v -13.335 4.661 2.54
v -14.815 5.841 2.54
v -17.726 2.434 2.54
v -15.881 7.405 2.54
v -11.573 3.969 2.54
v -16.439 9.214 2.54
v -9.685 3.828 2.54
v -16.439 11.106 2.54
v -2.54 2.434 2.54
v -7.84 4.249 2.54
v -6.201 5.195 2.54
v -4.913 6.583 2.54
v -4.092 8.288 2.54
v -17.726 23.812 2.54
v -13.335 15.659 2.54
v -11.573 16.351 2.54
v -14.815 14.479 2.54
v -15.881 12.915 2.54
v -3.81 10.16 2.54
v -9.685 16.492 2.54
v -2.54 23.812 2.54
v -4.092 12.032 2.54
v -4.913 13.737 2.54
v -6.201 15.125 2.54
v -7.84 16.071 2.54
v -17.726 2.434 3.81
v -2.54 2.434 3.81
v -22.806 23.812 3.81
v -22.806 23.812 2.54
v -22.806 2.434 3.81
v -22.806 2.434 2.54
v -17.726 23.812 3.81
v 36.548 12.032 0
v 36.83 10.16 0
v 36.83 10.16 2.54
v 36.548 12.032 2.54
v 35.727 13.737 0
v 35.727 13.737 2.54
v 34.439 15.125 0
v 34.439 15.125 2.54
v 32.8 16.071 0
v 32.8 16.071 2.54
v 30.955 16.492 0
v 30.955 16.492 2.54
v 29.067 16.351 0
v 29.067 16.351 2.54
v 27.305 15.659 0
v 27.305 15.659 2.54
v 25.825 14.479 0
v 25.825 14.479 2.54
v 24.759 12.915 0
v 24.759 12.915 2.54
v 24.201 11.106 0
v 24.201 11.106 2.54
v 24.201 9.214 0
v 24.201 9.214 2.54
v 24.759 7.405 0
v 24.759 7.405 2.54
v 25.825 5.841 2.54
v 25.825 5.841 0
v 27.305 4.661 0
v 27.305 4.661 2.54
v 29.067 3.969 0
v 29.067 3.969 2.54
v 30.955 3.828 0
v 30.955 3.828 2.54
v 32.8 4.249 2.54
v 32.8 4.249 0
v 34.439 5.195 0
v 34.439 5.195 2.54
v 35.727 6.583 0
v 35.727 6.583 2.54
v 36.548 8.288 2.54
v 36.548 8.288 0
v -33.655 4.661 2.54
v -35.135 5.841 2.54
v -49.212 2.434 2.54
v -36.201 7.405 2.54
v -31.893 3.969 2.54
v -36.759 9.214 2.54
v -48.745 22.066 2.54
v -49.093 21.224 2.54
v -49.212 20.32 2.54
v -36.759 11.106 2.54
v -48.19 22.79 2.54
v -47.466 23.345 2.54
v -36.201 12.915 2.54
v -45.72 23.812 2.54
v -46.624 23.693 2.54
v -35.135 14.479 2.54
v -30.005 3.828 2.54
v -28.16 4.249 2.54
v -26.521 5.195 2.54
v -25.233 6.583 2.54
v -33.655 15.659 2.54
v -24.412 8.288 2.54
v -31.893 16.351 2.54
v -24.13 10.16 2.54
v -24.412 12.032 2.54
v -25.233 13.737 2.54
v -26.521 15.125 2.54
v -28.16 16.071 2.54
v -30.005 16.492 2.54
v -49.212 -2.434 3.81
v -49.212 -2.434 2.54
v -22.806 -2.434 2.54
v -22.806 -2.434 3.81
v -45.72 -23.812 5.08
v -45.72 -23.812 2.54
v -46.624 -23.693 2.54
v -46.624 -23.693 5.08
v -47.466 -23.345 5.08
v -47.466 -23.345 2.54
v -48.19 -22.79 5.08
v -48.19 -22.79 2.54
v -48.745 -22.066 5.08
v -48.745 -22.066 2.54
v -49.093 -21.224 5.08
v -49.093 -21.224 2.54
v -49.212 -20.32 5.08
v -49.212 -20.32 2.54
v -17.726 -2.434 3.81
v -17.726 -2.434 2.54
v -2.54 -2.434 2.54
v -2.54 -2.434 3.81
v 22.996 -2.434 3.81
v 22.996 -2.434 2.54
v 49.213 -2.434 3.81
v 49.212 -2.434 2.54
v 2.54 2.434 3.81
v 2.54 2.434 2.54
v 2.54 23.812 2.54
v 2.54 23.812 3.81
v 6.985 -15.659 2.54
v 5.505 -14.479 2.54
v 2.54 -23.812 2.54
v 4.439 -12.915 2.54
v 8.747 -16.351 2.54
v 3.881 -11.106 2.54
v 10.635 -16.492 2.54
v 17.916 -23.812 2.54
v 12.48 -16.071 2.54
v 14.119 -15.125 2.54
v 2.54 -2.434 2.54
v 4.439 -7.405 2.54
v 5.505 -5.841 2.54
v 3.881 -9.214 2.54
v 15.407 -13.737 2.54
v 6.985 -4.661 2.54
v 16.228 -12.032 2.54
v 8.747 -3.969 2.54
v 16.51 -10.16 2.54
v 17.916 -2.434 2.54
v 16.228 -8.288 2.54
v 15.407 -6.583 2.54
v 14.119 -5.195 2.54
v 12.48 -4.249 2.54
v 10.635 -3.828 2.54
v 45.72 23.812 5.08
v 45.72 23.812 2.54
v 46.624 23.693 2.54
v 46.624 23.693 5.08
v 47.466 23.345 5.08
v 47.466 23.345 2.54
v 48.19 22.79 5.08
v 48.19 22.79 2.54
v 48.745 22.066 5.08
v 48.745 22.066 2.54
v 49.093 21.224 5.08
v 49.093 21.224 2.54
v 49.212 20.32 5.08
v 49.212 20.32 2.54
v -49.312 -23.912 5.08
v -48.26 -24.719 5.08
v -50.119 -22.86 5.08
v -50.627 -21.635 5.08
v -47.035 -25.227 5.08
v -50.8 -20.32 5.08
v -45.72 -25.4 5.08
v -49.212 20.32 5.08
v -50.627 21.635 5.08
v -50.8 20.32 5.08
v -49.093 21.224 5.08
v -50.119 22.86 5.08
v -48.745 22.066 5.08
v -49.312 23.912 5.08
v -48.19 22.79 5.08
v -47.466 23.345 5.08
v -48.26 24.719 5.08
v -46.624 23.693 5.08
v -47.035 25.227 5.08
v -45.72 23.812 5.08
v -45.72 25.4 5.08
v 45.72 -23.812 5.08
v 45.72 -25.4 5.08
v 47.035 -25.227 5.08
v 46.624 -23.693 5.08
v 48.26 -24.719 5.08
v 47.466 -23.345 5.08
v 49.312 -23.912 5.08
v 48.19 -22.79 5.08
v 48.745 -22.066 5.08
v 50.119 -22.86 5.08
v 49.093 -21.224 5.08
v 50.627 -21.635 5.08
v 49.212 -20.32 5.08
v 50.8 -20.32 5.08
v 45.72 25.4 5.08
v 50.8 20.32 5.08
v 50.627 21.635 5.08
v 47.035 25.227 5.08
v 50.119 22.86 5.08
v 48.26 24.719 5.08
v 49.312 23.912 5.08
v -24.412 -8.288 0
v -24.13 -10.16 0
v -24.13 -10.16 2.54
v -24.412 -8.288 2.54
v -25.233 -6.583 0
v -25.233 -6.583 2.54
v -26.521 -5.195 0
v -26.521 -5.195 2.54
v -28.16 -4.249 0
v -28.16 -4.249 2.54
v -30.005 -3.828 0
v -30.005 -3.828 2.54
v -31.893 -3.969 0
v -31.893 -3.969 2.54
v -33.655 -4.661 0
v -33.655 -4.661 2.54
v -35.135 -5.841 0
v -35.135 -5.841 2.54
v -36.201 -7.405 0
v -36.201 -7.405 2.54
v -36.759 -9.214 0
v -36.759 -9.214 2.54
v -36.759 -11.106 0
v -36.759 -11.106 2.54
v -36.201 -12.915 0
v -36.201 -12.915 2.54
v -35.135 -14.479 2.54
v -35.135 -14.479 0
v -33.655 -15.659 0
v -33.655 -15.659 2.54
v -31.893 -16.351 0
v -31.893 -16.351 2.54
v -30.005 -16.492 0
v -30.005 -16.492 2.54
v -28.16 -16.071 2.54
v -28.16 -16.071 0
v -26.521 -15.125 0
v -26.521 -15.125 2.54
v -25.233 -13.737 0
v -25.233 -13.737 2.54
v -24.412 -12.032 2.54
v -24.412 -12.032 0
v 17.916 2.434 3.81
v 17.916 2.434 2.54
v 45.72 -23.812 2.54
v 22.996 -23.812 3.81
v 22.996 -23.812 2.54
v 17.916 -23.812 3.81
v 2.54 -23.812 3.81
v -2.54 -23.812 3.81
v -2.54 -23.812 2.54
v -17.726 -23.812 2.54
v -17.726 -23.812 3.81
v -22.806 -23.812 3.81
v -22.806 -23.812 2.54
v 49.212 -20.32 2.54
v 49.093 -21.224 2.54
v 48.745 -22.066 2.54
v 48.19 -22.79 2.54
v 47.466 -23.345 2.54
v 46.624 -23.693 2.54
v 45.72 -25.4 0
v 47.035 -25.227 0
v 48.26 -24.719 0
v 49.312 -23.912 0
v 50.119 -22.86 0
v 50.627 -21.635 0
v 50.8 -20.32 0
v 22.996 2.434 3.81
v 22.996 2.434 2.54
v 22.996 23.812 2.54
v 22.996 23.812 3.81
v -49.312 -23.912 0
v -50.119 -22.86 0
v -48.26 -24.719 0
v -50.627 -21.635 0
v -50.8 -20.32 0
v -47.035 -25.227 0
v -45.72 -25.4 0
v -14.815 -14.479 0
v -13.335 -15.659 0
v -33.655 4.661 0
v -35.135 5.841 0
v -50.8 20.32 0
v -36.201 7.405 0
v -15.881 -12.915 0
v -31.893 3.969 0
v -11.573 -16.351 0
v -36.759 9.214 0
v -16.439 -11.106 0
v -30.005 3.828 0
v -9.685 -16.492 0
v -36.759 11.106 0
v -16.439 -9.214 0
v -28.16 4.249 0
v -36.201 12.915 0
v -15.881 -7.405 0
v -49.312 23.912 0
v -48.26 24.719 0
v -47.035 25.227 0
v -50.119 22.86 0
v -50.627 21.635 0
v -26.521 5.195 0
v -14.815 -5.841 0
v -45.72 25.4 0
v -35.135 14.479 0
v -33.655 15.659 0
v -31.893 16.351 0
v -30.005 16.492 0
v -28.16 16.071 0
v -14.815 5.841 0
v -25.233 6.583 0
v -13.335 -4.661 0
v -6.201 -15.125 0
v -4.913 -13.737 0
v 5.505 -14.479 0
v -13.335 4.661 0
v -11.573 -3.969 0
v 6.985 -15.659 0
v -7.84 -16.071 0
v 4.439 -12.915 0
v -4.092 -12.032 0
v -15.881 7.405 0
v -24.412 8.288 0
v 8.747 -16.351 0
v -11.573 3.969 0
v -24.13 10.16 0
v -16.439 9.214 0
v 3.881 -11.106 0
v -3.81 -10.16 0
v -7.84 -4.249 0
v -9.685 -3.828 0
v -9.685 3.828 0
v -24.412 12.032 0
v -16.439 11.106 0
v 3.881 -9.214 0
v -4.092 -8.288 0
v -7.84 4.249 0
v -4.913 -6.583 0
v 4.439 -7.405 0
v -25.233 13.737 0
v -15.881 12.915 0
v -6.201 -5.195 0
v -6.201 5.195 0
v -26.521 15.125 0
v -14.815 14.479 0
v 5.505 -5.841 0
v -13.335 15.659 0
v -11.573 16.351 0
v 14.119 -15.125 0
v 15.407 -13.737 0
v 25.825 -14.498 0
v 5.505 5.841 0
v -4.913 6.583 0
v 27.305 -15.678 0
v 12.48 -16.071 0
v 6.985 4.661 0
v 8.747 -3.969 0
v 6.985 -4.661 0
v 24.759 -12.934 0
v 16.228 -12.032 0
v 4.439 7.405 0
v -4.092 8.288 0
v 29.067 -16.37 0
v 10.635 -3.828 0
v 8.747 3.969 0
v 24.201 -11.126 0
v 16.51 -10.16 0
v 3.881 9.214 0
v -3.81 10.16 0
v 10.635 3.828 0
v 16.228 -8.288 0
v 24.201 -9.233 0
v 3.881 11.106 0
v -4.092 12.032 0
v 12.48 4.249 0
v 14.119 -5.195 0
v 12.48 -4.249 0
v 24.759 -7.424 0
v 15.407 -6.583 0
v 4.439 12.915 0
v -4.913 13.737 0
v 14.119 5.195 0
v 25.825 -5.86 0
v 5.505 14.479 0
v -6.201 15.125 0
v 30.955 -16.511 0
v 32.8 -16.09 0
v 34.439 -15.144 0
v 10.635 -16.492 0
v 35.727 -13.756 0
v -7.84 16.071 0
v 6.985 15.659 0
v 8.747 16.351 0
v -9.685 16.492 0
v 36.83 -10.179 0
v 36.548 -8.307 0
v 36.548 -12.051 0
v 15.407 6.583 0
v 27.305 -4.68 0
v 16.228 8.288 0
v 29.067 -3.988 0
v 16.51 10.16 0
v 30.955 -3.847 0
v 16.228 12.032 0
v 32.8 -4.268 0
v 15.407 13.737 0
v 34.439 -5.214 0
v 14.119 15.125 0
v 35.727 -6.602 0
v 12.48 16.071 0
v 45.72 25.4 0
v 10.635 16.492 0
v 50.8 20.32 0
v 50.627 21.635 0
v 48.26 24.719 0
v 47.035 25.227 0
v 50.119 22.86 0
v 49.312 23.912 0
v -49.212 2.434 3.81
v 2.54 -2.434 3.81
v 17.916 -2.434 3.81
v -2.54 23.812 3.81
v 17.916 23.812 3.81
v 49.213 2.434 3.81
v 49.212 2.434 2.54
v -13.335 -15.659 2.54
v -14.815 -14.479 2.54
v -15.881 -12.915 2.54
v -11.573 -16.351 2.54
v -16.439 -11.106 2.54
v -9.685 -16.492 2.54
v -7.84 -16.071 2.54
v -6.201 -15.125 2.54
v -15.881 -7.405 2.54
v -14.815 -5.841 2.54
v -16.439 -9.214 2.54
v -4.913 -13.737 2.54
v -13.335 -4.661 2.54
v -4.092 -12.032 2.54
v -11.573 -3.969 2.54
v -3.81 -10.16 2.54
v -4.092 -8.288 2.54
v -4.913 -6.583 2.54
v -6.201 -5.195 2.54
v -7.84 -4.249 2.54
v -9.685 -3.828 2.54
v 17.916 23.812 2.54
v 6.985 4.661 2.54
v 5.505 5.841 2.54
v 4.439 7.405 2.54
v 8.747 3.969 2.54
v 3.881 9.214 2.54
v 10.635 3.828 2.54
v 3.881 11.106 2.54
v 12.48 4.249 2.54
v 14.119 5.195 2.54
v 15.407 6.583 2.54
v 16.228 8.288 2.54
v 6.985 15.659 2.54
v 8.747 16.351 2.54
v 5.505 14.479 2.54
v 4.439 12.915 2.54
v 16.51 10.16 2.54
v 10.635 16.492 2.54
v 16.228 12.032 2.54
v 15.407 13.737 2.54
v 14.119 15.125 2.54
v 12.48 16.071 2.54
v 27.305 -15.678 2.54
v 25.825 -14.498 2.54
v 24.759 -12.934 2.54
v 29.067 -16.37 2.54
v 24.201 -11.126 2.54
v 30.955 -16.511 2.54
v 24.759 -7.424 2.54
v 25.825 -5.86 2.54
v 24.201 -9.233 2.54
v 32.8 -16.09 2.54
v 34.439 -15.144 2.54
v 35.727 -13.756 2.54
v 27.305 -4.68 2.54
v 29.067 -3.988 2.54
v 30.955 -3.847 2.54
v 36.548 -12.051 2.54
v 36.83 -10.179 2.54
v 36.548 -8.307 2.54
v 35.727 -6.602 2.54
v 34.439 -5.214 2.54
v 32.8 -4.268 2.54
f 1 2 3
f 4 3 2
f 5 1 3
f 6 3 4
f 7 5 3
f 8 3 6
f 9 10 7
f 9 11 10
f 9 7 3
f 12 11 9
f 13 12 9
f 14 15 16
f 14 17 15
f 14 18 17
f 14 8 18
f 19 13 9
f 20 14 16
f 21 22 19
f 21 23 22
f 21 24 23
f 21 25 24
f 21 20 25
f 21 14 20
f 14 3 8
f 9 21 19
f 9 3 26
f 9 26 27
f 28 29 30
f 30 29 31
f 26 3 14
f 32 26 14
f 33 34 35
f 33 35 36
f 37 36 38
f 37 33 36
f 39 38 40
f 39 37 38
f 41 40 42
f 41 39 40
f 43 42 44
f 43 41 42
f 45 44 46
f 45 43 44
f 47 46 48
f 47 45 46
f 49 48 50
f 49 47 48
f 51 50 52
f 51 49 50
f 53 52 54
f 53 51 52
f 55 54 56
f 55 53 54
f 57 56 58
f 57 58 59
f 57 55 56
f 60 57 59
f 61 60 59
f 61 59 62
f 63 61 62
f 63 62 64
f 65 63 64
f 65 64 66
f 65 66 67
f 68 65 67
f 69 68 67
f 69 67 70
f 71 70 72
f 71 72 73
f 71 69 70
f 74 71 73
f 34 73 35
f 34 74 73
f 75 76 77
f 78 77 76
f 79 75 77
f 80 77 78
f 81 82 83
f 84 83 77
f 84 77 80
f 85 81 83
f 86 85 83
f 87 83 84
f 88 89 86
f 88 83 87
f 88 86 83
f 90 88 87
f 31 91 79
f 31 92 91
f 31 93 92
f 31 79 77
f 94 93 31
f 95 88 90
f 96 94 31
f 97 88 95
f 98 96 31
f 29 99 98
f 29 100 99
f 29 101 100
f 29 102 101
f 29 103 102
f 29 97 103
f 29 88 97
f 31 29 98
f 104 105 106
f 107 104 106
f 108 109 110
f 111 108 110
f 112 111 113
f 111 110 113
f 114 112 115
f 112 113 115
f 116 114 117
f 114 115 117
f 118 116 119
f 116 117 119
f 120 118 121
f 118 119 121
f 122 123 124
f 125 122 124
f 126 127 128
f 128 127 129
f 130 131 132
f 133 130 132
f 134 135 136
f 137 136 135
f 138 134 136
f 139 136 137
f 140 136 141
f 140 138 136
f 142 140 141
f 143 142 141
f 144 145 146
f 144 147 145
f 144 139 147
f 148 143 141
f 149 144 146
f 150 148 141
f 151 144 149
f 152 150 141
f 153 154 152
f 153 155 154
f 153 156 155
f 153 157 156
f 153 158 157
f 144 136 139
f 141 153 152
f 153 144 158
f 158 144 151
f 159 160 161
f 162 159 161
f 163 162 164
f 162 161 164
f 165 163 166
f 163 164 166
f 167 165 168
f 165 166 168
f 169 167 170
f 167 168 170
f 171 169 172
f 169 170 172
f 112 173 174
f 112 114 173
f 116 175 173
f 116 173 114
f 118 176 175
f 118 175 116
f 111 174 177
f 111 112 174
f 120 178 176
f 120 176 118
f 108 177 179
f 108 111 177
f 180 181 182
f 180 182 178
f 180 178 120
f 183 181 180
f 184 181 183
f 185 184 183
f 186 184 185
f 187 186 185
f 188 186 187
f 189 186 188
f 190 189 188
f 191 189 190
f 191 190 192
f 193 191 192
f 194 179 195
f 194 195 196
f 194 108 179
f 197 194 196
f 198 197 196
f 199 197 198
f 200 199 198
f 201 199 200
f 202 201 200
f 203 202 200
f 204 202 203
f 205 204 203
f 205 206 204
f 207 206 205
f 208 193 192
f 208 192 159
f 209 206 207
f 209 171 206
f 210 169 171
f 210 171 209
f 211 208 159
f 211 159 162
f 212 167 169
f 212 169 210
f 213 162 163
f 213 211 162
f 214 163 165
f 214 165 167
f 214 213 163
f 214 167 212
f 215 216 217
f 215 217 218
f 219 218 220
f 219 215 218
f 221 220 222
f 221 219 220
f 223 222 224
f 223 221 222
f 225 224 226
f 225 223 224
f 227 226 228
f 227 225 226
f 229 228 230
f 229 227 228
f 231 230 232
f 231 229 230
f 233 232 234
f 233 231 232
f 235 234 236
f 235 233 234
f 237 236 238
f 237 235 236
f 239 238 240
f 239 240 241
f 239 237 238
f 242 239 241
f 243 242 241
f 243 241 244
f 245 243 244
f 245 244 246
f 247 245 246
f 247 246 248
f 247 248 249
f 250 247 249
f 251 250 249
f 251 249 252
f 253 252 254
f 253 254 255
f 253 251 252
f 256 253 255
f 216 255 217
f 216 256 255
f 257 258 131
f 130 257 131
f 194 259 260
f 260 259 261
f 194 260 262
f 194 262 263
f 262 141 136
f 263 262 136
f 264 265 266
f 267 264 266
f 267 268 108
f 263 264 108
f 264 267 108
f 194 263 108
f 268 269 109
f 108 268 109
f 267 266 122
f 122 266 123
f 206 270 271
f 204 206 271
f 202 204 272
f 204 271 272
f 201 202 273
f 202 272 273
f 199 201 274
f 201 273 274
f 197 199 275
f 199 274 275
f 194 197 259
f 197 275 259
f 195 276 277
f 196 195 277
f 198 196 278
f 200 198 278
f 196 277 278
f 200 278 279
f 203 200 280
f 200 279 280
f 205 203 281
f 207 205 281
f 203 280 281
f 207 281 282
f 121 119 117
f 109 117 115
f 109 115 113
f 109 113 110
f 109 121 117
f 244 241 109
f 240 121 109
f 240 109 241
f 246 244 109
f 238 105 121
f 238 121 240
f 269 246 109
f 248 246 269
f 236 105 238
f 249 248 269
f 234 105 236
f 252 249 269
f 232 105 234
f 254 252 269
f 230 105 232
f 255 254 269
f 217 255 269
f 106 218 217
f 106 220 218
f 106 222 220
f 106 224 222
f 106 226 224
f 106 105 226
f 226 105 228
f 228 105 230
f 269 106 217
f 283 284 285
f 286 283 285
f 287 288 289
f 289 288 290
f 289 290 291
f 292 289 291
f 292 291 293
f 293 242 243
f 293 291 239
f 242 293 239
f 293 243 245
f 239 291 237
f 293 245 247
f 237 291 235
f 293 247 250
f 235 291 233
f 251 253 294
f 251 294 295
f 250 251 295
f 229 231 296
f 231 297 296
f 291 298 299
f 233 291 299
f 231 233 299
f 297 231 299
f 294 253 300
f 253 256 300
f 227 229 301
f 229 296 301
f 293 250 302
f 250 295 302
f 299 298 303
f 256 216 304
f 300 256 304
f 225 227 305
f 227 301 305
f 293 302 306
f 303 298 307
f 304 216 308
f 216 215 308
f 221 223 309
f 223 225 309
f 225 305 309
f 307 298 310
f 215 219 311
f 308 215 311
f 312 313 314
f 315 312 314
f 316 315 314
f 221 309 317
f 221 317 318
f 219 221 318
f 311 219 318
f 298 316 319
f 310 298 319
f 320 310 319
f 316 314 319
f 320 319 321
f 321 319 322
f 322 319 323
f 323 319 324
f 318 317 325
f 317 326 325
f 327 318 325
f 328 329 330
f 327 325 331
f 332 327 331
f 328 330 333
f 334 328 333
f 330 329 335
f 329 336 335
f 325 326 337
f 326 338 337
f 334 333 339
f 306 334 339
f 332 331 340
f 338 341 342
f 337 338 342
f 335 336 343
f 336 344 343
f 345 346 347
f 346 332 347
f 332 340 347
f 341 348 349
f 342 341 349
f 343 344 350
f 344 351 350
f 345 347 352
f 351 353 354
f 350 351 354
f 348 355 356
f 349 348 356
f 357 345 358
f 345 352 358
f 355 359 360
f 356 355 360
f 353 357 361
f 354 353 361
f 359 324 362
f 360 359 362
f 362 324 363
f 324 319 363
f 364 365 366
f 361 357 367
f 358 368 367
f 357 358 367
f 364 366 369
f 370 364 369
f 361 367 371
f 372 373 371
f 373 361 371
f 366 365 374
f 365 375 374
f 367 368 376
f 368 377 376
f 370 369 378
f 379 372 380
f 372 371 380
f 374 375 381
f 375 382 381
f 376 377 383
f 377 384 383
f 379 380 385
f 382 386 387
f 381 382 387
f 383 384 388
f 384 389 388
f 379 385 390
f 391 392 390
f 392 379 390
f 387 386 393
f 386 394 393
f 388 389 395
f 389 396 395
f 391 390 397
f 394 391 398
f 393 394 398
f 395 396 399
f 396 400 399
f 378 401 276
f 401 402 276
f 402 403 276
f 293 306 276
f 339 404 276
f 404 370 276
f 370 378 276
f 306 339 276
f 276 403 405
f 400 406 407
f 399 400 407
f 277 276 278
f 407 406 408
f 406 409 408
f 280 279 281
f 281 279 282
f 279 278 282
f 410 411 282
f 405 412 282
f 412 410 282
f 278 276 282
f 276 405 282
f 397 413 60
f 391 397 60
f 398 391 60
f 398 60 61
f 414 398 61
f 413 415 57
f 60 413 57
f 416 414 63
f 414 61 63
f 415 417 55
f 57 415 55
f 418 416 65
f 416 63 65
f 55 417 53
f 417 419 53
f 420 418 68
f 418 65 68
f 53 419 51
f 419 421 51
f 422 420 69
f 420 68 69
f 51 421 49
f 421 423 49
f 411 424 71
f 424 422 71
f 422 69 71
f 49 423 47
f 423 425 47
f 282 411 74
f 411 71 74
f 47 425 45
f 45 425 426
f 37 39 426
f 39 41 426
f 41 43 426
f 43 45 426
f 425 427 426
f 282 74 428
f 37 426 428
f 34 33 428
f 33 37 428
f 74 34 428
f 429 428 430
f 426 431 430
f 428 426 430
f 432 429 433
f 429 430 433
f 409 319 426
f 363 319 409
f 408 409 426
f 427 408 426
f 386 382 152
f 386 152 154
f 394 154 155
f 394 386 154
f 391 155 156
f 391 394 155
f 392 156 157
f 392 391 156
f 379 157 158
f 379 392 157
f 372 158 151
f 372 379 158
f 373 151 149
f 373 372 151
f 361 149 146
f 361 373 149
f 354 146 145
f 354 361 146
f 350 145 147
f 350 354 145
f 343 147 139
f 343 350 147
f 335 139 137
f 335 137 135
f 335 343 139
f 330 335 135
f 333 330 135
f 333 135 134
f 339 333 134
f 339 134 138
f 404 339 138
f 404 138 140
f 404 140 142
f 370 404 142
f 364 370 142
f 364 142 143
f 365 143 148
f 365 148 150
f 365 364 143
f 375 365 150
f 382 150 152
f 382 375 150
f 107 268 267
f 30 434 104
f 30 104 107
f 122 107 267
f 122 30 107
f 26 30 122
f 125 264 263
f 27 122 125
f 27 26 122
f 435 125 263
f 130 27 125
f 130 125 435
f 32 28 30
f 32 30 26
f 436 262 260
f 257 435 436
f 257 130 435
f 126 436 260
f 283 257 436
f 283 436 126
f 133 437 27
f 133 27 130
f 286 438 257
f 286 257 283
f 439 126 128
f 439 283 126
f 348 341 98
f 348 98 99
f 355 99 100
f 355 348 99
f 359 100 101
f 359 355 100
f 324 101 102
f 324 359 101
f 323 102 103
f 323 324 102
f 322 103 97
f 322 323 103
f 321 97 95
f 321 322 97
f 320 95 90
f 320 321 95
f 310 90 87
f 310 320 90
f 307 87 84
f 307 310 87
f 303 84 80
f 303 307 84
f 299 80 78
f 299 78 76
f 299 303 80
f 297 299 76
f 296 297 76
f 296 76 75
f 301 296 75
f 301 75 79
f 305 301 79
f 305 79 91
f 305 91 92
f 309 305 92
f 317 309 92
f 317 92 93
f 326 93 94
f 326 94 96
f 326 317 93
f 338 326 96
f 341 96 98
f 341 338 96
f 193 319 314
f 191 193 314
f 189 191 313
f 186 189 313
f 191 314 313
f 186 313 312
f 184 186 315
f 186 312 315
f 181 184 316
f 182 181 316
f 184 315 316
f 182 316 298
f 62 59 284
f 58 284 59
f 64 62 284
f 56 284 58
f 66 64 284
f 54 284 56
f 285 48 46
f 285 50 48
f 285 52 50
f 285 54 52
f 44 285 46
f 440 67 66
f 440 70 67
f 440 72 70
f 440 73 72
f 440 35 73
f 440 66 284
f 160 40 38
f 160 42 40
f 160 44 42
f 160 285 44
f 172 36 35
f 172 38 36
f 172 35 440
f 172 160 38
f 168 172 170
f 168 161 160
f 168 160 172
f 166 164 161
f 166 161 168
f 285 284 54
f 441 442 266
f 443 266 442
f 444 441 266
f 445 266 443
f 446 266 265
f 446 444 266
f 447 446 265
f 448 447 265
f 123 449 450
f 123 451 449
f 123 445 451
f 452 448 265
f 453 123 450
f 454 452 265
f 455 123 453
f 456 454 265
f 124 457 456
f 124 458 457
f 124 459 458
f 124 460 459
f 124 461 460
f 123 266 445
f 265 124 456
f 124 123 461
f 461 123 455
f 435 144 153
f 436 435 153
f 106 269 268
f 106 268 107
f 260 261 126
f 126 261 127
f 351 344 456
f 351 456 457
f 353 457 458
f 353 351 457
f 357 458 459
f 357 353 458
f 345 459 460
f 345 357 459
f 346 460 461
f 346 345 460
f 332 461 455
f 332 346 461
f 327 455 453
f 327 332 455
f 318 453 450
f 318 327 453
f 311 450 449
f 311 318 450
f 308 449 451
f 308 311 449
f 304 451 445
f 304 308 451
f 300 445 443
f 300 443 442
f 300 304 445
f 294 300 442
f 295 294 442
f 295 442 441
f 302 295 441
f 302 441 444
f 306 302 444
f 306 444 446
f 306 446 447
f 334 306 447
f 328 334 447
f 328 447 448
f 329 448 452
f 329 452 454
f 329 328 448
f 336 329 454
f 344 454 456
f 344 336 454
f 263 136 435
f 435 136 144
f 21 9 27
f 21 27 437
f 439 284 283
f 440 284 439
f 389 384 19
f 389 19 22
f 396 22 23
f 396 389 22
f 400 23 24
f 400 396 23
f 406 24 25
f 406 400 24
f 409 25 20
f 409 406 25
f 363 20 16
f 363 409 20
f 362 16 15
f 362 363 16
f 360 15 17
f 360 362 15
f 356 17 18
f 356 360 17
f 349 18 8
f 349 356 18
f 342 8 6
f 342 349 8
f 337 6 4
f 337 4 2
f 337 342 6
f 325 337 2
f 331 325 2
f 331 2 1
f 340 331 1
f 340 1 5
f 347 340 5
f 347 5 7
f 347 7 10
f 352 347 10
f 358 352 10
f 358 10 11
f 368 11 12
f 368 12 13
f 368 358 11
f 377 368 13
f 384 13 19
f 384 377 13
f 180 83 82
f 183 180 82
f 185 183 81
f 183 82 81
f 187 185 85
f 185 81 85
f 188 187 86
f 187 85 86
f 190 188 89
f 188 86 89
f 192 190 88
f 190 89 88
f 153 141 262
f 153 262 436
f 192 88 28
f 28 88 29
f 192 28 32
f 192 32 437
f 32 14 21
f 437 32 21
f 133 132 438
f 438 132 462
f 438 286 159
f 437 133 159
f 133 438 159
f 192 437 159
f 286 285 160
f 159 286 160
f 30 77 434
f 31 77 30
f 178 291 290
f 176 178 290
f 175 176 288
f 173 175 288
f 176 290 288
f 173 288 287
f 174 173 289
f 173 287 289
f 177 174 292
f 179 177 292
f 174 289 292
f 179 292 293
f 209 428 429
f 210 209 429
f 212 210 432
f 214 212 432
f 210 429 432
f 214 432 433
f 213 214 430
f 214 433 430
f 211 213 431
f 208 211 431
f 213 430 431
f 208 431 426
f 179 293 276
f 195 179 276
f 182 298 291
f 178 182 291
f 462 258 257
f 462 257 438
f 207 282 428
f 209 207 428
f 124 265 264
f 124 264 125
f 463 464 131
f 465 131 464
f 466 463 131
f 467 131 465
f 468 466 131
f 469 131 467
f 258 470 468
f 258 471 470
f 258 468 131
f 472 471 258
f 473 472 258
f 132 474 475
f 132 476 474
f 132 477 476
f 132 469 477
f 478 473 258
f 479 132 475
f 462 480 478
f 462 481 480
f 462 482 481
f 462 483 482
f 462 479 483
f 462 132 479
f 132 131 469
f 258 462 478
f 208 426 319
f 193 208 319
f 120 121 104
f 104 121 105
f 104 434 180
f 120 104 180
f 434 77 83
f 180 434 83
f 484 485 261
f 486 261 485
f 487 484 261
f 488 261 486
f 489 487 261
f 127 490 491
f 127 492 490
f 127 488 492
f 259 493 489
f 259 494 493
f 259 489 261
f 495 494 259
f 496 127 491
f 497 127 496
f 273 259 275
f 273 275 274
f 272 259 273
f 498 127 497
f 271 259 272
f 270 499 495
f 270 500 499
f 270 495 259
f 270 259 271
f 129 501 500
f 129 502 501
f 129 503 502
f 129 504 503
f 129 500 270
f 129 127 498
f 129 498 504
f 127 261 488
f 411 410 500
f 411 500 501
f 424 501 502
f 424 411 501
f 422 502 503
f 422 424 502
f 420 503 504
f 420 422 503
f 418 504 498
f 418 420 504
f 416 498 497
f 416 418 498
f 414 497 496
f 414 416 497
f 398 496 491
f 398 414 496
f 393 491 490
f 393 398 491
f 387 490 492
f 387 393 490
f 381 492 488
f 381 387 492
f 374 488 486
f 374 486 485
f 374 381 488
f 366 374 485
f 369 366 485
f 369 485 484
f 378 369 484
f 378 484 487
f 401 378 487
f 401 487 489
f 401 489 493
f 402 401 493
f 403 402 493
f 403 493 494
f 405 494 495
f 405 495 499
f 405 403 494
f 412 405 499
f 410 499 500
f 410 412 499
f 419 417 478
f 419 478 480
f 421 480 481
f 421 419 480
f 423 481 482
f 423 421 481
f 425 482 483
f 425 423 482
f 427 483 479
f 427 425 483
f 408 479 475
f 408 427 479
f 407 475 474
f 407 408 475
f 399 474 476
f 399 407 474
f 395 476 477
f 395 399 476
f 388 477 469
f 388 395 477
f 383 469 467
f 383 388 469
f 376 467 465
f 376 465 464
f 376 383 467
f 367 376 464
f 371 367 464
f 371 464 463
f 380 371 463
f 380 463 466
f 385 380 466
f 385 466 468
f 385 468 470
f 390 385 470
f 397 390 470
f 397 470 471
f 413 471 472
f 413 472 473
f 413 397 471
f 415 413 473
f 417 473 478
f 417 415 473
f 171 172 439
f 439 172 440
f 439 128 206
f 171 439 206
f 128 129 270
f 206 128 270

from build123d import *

# Parameters (mm, degrees)
F1_DEPTH = 5.08
F0_W     = 5.08
F0_H     = 21.3788050804
F0_H_2   = 4.8673898391
F0_W_2   = 26.406345436
F0_W_3   = 15.186154564
F0_W_4   = 15.3763087159
F0_W_5   = 26.2161912841
F2_DEPTH = 3.81
F0_R     = 6.35
F3_DEPTH = 2.54


with BuildPart() as f1:
    # F0 (on Top) → F1 (new body)
    with BuildSketch(Plane.XY):
        with BuildLine():
            ThreePointArc((-50.8, -20.32), (-49.3121024484, -23.9121024484), (-45.72, -25.4))
            Line((-45.72, -25.4), (45.72, -25.4))
            ThreePointArc((45.72, -25.4), (49.3121024484, -23.9121024484), (50.8, -20.32))
            Line((50.8, -20.32), (50.8, 20.32))
            ThreePointArc((50.8, 20.32), (49.3121024484, 23.9121024484), (45.72, 25.4))
            Line((45.72, 25.4), (-45.72, 25.4))
            ThreePointArc((-45.72, 25.4), (-49.3121024484, 23.9121024484), (-50.8, 20.32))
            Line((-50.8, 20.32), (-50.8, -20.32))
        make_face()
        with BuildLine():
            ThreePointArc((-49.2125, 20.32), (-48.1895704333, 22.7895704333), (-45.72, 23.8125))
            Line((-45.72, 23.8125), (-22.806154564, 23.8125))
            Line((-22.806154564, 23.8125), (-17.726154564, 23.8125))
            Line((-17.726154564, 23.8125), (-2.54, 23.8125))
            Line((-2.54, 23.8125), (2.54, 23.8125))
            Line((2.54, 23.8125), (17.9163087159, 23.8125))
            Line((17.9163087159, 23.8125), (22.9963087159, 23.8125))
            Line((22.9963087159, 23.8125), (45.72, 23.8125))
            ThreePointArc((45.72, 23.8125), (48.1895704333, 22.7895704333), (49.2125, 20.32))
            Line((49.2125, 20.32), (49.2125, 2.4336949196))
            Line((49.2125, 2.4336949196), (49.2125, -2.4336949196))
            Line((49.2125, -2.4336949196), (49.2125, -20.32))
            ThreePointArc((49.2125, -20.32), (48.1895704333, -22.7895704333), (45.72, -23.8125))
            Line((45.72, -23.8125), (22.9963087159, -23.8125))
            Line((22.9963087159, -23.8125), (17.9163087159, -23.8125))
            Line((17.9163087159, -23.8125), (2.54, -23.8125))
            Line((2.54, -23.8125), (-2.54, -23.8125))
            Line((-2.54, -23.8125), (-17.726154564, -23.8125))
            Line((-17.726154564, -23.8125), (-22.806154564, -23.8125))
            Line((-22.806154564, -23.8125), (-45.72, -23.8125))
            ThreePointArc((-45.72, -23.8125), (-48.1895704333, -22.7895704333), (-49.2125, -20.32))
            Line((-49.2125, -20.32), (-49.2125, -2.4336949196))
            Line((-49.2125, -2.4336949196), (-49.2125, 2.4336949196))
            Line((-49.2125, 2.4336949196), (-49.2125, 20.32))
        make_face(mode=Mode.SUBTRACT)
    extrude(amount=F1_DEPTH)

    # F0 (on Top) → F2 (join)
    with BuildSketch(Plane.XY):
        with Locations((-20.266154564, 13.1230974598)):
            Rectangle(F0_W, F0_H)
        with Locations((-20.266154564, 0)):
            Rectangle(F0_W, F0_H_2)
        with Locations((-36.009327282, 0)):
            Rectangle(F0_W_2, F0_H_2)
        with Locations((-20.266154564, -13.1230974598)):
            Rectangle(F0_W, F0_H)
        with Locations((-10.133077282, 0)):
            Rectangle(F0_W_3, F0_H_2)
        with Locations((0, 13.1230974598)):
            Rectangle(F0_W, F0_H)
        with Locations((0, -13.1230974598)):
            Rectangle(F0_W, F0_H)
        Rectangle(F0_W, F0_H_2)
        with Locations((10.228154358, 0)):
            Rectangle(F0_W_4, F0_H_2)
        with Locations((20.4563087159, 0)):
            Rectangle(F0_W, F0_H_2)
        with Locations((20.4563087159, 13.1230974598)):
            Rectangle(F0_W, F0_H)
        with Locations((20.4563087159, -13.1230974598)):
            Rectangle(F0_W, F0_H)
        with Locations((36.104404358, 0)):
            Rectangle(F0_W_5, F0_H_2)
    extrude(amount=F2_DEPTH)

    # F0 (on Top) → F3 (join)
    with BuildSketch(Plane.XY):
        with BuildLine():
            Line((-22.806154564, 23.8125), (-45.72, 23.8125))
            ThreePointArc((-45.72, 23.8125), (-48.1895704333, 22.7895704333), (-49.2125, 20.32))
            Line((-49.2125, 20.32), (-49.2125, 2.4336949196))
            Line((-49.2125, 2.4336949196), (-22.806154564, 2.4336949196))
            Line((-22.806154564, 2.4336949196), (-22.806154564, 23.8125))
        make_face()
        with Locations((-30.48, 10.16)):
            Circle(F0_R, mode=Mode.SUBTRACT)
        with Locations((-10.133077282, 13.1230974598)):
            Rectangle(F0_W_3, F0_H)
        with Locations((-10.16, 10.16)):
            Circle(F0_R, mode=Mode.SUBTRACT)
        with Locations((10.228154358, 13.1230974598)):
            Rectangle(F0_W_4, F0_H)
        with Locations((10.16, 10.16)):
            Circle(F0_R, mode=Mode.SUBTRACT)
        with BuildLine():
            Line((45.72, 23.8125), (22.9963087159, 23.8125))
            Line((22.9963087159, 23.8125), (22.9963087159, 2.4336949196))
            Line((22.9963087159, 2.4336949196), (49.2125, 2.4336949196))
            Line((49.2125, 2.4336949196), (49.2125, 20.32))
            ThreePointArc((49.2125, 20.32), (48.1895704333, 22.7895704333), (45.72, 23.8125))
        make_face()
        with Locations((30.48, 10.16)):
            Circle(F0_R, mode=Mode.SUBTRACT)
        with BuildLine():
            Line((49.2125, -2.4336949196), (22.9963087159, -2.4336949196))
            Line((22.9963087159, -2.4336949196), (22.9963087159, -23.8125))
            Line((22.9963087159, -23.8125), (45.72, -23.8125))
            ThreePointArc((45.72, -23.8125), (48.1895704333, -22.7895704333), (49.2125, -20.32))
            Line((49.2125, -20.32), (49.2125, -2.4336949196))
        make_face()
        with Locations((30.48, -10.179114528)):
            Circle(F0_R, mode=Mode.SUBTRACT)
        with Locations((10.228154358, -13.1230974598)):
            Rectangle(F0_W_4, F0_H)
        with Locations((10.16, -10.16)):
            Circle(F0_R, mode=Mode.SUBTRACT)
        with Locations((-10.133077282, -13.1230974598)):
            Rectangle(F0_W_3, F0_H)
        with Locations((-10.16, -10.16)):
            Circle(F0_R, mode=Mode.SUBTRACT)
        with BuildLine():
            Line((-22.806154564, -2.4336949196), (-49.2125, -2.4336949196))
            Line((-49.2125, -2.4336949196), (-49.2125, -20.32))
            ThreePointArc((-49.2125, -20.32), (-48.1895704333, -22.7895704333), (-45.72, -23.8125))
            Line((-45.72, -23.8125), (-22.806154564, -23.8125))
            Line((-22.806154564, -23.8125), (-22.806154564, -2.4336949196))
        make_face()
        with Locations((-30.48, -10.16)):
            Circle(F0_R, mode=Mode.SUBTRACT)
    extrude(amount=F3_DEPTH)


solid = f1.part
